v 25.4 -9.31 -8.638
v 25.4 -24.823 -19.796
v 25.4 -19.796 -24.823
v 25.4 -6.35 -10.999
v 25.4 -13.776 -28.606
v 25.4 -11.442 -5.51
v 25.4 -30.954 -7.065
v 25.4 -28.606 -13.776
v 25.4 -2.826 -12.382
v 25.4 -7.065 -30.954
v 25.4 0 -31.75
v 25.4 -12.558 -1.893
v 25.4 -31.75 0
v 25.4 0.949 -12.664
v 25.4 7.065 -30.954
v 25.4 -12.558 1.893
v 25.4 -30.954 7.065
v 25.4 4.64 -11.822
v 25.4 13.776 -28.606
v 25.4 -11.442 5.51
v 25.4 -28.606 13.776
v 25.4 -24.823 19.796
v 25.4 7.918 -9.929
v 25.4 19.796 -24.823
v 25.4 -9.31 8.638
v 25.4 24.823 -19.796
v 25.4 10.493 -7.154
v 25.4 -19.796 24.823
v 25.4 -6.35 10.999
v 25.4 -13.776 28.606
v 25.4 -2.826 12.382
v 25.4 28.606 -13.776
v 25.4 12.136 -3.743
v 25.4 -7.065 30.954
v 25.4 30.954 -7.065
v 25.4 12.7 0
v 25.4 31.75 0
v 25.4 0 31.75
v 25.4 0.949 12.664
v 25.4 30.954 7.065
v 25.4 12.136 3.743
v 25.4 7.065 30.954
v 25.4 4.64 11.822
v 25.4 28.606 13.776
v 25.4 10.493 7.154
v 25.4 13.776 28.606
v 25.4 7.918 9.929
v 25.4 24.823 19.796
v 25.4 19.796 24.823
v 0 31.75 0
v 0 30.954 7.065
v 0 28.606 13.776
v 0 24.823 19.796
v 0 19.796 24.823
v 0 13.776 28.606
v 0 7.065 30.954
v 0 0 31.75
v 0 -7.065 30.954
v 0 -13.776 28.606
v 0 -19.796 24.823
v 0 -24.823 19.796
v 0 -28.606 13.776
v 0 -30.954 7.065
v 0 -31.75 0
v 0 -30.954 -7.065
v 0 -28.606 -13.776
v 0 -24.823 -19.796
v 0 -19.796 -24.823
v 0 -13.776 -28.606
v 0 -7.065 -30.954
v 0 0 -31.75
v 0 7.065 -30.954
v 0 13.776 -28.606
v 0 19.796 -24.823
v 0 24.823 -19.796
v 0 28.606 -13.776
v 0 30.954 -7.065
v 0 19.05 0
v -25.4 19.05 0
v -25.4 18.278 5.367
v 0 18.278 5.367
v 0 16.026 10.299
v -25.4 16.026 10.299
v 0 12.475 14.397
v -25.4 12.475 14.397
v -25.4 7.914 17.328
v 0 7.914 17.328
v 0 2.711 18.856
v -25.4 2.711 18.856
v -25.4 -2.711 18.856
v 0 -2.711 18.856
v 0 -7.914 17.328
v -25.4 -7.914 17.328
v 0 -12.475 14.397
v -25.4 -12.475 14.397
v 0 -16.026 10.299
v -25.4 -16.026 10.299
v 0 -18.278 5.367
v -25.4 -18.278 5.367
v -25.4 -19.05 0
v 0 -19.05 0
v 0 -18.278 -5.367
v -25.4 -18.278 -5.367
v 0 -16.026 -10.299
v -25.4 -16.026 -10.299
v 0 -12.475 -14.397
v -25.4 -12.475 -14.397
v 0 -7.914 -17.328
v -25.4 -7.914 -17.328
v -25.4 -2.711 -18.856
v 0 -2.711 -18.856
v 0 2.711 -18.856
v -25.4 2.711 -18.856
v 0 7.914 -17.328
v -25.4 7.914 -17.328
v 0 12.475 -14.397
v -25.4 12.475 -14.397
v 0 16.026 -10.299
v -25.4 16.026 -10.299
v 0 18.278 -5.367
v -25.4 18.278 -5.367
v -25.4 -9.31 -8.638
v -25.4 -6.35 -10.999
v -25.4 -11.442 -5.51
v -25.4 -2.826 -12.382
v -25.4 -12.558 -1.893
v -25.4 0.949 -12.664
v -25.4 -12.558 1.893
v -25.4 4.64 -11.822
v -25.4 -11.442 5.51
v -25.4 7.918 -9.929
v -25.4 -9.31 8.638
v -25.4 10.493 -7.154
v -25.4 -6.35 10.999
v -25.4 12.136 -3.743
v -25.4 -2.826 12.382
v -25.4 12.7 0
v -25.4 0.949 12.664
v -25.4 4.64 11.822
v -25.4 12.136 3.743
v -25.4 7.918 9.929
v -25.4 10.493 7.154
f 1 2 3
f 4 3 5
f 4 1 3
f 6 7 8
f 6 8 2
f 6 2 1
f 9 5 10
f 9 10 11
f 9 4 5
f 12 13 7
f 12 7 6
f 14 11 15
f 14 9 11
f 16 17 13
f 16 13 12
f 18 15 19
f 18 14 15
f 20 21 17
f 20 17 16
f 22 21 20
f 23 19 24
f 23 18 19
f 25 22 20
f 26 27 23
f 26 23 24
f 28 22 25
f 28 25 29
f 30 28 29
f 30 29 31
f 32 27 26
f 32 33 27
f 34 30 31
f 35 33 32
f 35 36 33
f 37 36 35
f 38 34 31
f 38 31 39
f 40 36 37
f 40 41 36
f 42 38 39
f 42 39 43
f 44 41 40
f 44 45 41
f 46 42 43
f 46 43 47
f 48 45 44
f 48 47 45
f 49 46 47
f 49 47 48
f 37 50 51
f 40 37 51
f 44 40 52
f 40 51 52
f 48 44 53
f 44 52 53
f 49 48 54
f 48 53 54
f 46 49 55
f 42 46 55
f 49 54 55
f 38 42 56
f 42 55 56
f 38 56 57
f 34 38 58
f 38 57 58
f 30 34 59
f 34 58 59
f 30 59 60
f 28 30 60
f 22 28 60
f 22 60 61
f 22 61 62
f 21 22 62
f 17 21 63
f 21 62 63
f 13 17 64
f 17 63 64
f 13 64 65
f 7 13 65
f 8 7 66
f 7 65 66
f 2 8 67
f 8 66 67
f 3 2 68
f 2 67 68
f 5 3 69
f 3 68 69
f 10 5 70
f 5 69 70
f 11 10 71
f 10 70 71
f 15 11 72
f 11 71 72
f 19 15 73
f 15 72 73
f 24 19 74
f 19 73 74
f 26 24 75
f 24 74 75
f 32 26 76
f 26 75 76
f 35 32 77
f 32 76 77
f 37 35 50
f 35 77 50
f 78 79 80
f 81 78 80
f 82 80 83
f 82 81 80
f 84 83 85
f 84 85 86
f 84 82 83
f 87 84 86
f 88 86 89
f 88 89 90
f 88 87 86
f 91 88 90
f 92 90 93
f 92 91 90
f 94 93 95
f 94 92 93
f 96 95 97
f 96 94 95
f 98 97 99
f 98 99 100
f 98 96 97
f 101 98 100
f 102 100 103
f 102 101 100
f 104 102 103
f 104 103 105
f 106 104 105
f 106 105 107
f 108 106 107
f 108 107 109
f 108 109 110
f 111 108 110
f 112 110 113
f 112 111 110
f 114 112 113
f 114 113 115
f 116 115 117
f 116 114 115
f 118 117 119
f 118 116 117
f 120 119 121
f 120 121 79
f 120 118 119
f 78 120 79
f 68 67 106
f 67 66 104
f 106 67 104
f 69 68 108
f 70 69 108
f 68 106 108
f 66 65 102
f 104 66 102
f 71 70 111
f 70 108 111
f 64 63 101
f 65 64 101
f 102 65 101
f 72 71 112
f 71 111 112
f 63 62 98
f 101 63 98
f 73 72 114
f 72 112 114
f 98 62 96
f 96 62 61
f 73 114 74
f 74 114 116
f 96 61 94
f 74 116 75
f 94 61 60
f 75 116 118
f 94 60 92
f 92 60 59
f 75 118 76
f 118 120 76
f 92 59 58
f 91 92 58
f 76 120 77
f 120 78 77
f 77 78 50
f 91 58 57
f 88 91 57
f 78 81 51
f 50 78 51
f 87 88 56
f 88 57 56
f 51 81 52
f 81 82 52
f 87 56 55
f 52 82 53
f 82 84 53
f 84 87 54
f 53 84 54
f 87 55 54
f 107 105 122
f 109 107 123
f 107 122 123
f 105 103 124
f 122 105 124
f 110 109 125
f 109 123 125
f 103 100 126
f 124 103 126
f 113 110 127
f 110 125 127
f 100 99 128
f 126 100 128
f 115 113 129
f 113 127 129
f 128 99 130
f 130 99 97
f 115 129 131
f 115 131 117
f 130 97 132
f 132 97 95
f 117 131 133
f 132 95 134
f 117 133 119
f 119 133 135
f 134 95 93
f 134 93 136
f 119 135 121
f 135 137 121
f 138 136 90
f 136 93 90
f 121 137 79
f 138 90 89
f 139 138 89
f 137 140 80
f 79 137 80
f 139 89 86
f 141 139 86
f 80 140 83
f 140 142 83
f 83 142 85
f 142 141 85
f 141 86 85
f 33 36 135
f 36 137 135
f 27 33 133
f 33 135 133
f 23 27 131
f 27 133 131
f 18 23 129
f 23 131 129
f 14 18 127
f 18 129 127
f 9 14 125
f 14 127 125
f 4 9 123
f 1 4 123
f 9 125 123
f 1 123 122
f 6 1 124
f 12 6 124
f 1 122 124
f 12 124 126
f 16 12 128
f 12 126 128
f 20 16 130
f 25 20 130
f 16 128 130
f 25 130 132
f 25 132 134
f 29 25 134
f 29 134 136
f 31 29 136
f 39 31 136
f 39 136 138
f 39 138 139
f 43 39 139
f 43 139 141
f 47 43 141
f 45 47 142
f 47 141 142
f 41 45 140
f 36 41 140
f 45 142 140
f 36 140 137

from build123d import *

# Parameters (mm, degrees)
F0_R      = 19.05
F0_R_2    = 12.7
F1_DEPTH  = 25.4
F2_R      = 31.75
F3_DEPTH  = 25.4
F3_FACE_R = 12.7
F4_DEPTH  = 25.4


with BuildPart() as f1:
    # F0 (on Right) → F1 (new body)
    with BuildSketch(Plane.YZ):
        Circle(F0_R)
        Circle(F0_R_2, mode=Mode.SUBTRACT)
    extrude(amount=-F1_DEPTH)

    # F2 (on Right) → F3 (join)
    with BuildSketch(Plane.YZ):
        Circle(F2_R)
    extrude(amount=F3_DEPTH)

    # F3_face (on face) → F4 (cut)
    with BuildSketch(Plane(origin=(0, 0, 0), x_dir=(0, 1, 0), z_dir=(-1, 0, 0))):
        Circle(F3_FACE_R)
    extrude(amount=-F4_DEPTH, mode=Mode.SUBTRACT)


solid = f1.part
